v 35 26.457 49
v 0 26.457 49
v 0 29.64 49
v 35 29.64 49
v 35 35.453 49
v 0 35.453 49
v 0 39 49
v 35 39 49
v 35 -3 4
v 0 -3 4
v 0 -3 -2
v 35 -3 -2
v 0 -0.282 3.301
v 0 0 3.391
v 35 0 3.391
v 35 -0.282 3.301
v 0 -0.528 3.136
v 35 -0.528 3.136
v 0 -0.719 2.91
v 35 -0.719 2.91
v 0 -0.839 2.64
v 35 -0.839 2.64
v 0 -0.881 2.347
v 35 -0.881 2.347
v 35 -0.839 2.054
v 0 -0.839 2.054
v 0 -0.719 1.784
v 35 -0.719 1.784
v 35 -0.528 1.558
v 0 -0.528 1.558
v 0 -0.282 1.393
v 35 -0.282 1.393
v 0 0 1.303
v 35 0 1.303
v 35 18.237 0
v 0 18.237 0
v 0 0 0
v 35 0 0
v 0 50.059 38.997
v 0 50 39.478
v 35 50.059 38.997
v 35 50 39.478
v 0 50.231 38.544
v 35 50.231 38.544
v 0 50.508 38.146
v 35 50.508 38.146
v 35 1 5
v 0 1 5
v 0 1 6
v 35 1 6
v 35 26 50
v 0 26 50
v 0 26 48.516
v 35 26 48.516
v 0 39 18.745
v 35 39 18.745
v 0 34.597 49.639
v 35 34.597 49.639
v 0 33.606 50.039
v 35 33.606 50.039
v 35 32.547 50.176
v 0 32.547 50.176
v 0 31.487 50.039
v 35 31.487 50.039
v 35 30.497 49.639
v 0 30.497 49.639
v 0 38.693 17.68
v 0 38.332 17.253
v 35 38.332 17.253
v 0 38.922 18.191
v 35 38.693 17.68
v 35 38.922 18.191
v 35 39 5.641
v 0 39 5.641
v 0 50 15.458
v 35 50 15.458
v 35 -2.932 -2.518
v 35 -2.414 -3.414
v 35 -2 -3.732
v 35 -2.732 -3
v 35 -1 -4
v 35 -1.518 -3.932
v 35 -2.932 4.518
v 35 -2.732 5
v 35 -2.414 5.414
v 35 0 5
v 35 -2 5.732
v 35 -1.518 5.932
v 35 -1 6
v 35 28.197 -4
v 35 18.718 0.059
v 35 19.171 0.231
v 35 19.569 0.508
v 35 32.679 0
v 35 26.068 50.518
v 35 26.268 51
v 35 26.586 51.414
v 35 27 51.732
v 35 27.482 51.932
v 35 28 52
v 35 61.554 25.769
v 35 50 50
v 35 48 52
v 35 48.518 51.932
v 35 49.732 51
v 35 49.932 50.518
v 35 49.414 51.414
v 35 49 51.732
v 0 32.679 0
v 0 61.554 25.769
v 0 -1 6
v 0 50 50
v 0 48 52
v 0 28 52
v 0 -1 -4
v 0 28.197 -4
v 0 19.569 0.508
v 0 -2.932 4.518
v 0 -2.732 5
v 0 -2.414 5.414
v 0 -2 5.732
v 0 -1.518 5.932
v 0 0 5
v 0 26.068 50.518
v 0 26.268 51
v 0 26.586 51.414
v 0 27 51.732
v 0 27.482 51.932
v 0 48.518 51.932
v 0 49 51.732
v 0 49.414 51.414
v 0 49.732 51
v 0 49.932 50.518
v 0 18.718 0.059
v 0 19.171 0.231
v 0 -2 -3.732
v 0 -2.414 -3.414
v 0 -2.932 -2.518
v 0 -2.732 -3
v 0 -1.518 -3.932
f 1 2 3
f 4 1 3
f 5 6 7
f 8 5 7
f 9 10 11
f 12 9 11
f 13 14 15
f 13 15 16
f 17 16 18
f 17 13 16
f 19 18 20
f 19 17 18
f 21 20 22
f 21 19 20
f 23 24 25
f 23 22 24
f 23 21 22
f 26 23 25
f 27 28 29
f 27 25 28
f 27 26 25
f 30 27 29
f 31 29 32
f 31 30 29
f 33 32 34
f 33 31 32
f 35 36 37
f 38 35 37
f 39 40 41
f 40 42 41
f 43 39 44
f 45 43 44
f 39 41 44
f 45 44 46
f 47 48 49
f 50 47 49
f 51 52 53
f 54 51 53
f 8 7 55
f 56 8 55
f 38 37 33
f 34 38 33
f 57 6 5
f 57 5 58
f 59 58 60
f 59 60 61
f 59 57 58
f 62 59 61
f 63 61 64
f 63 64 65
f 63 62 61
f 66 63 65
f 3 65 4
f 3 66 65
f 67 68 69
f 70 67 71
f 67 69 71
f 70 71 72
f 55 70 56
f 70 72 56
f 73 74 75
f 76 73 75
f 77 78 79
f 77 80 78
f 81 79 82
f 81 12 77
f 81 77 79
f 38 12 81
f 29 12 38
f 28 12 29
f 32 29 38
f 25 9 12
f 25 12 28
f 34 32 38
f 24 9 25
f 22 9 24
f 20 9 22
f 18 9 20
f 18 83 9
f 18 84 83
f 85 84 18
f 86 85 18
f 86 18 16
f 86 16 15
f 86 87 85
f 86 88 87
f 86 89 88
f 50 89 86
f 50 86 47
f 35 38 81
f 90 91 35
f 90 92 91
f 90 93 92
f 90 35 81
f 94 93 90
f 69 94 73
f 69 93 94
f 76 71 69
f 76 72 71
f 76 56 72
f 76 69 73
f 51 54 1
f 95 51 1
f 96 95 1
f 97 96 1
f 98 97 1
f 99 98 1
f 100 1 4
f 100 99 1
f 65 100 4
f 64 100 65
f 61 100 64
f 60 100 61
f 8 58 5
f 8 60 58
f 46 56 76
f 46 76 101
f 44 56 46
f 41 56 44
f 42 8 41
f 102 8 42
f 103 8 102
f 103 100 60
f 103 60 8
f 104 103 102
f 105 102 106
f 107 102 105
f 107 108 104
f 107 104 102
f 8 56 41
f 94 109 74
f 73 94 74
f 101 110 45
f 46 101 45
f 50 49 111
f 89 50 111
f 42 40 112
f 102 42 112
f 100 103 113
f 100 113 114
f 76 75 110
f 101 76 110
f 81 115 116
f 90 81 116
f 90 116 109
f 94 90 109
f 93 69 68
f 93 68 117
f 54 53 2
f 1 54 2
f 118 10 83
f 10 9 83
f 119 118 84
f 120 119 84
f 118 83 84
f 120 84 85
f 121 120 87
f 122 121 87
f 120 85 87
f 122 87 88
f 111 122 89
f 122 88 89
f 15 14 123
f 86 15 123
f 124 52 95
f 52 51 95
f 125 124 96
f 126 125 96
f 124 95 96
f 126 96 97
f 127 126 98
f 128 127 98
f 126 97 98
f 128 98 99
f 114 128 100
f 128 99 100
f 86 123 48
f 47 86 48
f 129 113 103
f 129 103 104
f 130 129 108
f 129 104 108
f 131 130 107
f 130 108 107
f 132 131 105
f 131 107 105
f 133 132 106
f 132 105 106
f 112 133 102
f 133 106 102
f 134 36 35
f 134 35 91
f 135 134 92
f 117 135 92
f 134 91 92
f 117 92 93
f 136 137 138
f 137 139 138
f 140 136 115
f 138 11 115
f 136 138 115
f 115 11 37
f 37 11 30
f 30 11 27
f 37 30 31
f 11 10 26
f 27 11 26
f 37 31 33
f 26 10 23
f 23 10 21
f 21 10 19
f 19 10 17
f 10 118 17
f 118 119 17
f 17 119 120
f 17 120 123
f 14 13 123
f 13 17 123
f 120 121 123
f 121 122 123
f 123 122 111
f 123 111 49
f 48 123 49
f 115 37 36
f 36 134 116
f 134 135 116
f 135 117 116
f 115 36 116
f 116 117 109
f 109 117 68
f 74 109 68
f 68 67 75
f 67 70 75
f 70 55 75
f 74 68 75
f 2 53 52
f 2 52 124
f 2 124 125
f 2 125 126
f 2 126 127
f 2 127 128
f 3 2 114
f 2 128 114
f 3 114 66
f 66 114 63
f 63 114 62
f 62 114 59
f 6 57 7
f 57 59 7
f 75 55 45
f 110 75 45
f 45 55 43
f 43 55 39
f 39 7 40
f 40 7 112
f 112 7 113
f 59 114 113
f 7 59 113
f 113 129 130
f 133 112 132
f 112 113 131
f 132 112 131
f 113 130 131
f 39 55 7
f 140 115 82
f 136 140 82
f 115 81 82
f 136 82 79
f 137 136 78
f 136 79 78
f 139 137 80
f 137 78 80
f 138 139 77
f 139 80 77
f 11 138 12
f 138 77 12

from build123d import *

# Parameters (mm, degrees)
F1_DEPTH = 35
F3_DEPTH = 35
F5_DEPTH = 35
F7_DEPTH = 35.001
F8_R     = 2


with BuildPart() as f1:
    # F0 (on Right) → F1 (new body)
    with BuildSketch(Plane.YZ):
        Polygon((19, 0), (0, 0), (0, 5), (1, 5), (1, 6), (-3, 6), (-3, -4), (28.1972419471, -4), (32.6792613945, 0), align=None)
        Polygon((39, 17.8490970284), (19, 0), (32.6792613945, 0), (39, 5.6409738331), align=None)
        Polygon((39, 49), (39, 17.8490970284), (39, 5.6409738331), (50, 15.4579771987), (50, 38.7150122165), (50, 52), (26, 52), (26, 49), align=None)
        Polygon((50, 38.7150122165), (50, 15.4579771987), (61.5536515036, 25.7690895346), align=None)
    extrude(amount=F1_DEPTH)

    # F2 (on face) → F3 (join)
    with BuildSketch(Plane.YZ):
        Polygon((26.4567731472, 49), (26, 49), (26, 48.5158836246), align=None)
    extrude(amount=F3_DEPTH)

    # F4 (on Right) → F5 (cut, through all)
    with BuildSketch(Plane.YZ):
        with BuildLine():
            Line((29.6401511878, 49), (35.453248769, 49))
            ThreePointArc((35.453248769, 49), (32.5466999784, 50.1759769875), (29.6401511878, 49))
        make_face()
    extrude(amount=F5_DEPTH, mode=Mode.SUBTRACT)

    # F6 (on face) → F7 (cut, through all)
    with BuildSketch(Plane.YZ):
        with BuildLine():
            Line((0, 1.3031382114), (0, 3.3907820471))
            ThreePointArc((0, 3.3907820471), (-0.8807520402, 2.3469601292), (0, 1.3031382114))
        make_face()
    extrude(amount=F7_DEPTH, mode=Mode.SUBTRACT)

    # F8
    f8_edges = [f1.edges().sort_by_distance(p)[0] for p in [
        (17.5, 50, 52),
        (17.5, -3, -4),
        (17.5, -3, 6),
        (17.5, 26, 52),
        (17.5, 39, 17.849097),
        (17.5, 19, 0),
        (17.5, 50, 38.715012),
    ]]
    fillet(f8_edges, radius=F8_R)


solid = f1.part
